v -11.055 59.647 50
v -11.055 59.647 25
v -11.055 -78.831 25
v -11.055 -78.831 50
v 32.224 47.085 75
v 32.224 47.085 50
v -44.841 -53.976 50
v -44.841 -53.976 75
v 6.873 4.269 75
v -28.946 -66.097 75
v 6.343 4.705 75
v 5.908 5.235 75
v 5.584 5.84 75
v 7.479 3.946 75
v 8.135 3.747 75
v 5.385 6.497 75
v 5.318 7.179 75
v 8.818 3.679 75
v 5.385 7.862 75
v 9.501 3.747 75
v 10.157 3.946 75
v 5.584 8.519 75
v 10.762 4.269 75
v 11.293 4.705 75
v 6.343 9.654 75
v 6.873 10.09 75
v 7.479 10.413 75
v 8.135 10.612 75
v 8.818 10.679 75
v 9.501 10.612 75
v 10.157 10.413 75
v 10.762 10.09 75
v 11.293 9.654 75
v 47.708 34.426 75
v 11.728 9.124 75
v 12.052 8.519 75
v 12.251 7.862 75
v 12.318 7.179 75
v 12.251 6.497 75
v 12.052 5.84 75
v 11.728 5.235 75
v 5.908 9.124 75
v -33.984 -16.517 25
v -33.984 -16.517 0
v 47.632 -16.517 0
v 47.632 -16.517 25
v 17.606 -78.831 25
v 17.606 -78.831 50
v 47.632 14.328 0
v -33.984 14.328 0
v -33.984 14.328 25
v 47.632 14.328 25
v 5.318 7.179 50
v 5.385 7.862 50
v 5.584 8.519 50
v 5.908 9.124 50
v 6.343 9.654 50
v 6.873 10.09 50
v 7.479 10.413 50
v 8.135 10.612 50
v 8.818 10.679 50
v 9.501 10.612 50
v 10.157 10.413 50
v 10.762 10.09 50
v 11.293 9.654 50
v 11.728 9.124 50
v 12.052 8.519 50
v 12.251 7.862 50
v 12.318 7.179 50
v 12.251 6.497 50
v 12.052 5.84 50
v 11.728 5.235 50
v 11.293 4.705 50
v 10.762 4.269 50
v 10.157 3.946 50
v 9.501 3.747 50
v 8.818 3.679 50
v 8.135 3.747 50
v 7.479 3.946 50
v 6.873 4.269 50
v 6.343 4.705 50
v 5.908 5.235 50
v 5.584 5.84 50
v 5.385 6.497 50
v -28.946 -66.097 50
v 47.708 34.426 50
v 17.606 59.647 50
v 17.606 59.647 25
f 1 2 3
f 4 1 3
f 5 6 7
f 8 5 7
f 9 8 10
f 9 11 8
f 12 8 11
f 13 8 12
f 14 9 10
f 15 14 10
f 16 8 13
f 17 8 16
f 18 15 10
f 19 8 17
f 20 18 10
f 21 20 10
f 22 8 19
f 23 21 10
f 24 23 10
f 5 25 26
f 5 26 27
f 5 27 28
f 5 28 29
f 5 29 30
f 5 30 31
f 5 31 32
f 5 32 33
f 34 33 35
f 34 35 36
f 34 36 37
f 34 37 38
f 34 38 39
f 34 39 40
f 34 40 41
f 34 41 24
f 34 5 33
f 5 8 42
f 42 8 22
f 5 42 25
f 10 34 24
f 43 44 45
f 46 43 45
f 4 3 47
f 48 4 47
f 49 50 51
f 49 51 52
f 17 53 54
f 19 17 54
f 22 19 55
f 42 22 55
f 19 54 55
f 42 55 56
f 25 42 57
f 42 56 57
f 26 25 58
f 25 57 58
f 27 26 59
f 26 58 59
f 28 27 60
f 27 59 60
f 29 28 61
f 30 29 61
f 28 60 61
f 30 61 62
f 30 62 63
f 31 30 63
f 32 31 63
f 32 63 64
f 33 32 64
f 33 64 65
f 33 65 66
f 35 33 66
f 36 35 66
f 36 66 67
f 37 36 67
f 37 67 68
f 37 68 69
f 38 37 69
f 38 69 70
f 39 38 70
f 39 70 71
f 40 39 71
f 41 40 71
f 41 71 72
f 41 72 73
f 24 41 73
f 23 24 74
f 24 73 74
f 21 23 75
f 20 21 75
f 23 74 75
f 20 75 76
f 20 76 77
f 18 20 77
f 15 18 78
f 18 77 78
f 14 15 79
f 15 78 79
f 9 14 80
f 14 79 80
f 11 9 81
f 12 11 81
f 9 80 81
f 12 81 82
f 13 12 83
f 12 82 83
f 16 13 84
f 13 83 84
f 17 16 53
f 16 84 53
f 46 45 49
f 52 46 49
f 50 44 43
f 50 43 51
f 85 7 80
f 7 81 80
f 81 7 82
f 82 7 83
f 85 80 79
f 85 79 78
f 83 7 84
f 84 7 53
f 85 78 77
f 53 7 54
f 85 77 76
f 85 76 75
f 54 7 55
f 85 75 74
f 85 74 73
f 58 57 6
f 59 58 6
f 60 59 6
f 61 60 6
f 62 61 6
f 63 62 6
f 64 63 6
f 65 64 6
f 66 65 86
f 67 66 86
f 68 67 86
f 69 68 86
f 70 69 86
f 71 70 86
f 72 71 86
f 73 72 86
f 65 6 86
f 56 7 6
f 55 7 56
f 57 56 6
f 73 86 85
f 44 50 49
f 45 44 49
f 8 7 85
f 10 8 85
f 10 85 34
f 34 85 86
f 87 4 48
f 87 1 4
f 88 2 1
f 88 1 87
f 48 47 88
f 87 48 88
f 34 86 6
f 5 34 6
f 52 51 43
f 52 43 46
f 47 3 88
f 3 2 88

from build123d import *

# Parameters (mm, degrees)
F0_W     = 81.6161185503
F0_H     = 30.8448886499
F1_DEPTH = 25
F2_W     = 28.6611793563
F2_H     = 138.4778022766
F2_H_2   = 45.3190533444
F3_DEPTH = 25
F5_DEPTH = 25
F7_D     = 7


# Not quite as in the source:
# - a feature names something its author has since deleted; it is built from what else it names


with BuildPart() as f1:
    # F0 (on Top) → F1 (new body)
    with BuildSketch(Plane.XY):
        with Locations((6.8240910769, -1.094697509)):
            Rectangle(F0_W, F0_H)
    extrude(amount=F1_DEPTH)


with BuildPart() as f3:
    # F2 (on face) → F3 (new body)
    with BuildSketch(Plane.XY.offset(25)):
        with Locations((3.2755625434, -9.5921009779)):
            Rectangle(F2_W, F2_H)
        with Locations((3.2755625434, 36.9872734882)):
            Rectangle(F2_W, F2_H_2)
    extrude(amount=F3_DEPTH)


with BuildPart() as f5:
    # F4 (on face) → F5 (new body)
    with BuildSketch(Plane.XY.offset(50)):
        Polygon((47.707793434, 34.4260234633), (32.224177393, 47.0853138974), (-44.8405611611, -53.9763291491), (-28.9460210758, -66.0967394174), align=None)
    extrude(amount=F5_DEPTH)

    # F7 (through all)
    with Locations(Plane.XY.offset(75)):
        with Locations((8.8179567829, 7.1794758551)):
            Hole(F7_D / 2)


solid = Compound([f1.part, f3.part, f5.part])
